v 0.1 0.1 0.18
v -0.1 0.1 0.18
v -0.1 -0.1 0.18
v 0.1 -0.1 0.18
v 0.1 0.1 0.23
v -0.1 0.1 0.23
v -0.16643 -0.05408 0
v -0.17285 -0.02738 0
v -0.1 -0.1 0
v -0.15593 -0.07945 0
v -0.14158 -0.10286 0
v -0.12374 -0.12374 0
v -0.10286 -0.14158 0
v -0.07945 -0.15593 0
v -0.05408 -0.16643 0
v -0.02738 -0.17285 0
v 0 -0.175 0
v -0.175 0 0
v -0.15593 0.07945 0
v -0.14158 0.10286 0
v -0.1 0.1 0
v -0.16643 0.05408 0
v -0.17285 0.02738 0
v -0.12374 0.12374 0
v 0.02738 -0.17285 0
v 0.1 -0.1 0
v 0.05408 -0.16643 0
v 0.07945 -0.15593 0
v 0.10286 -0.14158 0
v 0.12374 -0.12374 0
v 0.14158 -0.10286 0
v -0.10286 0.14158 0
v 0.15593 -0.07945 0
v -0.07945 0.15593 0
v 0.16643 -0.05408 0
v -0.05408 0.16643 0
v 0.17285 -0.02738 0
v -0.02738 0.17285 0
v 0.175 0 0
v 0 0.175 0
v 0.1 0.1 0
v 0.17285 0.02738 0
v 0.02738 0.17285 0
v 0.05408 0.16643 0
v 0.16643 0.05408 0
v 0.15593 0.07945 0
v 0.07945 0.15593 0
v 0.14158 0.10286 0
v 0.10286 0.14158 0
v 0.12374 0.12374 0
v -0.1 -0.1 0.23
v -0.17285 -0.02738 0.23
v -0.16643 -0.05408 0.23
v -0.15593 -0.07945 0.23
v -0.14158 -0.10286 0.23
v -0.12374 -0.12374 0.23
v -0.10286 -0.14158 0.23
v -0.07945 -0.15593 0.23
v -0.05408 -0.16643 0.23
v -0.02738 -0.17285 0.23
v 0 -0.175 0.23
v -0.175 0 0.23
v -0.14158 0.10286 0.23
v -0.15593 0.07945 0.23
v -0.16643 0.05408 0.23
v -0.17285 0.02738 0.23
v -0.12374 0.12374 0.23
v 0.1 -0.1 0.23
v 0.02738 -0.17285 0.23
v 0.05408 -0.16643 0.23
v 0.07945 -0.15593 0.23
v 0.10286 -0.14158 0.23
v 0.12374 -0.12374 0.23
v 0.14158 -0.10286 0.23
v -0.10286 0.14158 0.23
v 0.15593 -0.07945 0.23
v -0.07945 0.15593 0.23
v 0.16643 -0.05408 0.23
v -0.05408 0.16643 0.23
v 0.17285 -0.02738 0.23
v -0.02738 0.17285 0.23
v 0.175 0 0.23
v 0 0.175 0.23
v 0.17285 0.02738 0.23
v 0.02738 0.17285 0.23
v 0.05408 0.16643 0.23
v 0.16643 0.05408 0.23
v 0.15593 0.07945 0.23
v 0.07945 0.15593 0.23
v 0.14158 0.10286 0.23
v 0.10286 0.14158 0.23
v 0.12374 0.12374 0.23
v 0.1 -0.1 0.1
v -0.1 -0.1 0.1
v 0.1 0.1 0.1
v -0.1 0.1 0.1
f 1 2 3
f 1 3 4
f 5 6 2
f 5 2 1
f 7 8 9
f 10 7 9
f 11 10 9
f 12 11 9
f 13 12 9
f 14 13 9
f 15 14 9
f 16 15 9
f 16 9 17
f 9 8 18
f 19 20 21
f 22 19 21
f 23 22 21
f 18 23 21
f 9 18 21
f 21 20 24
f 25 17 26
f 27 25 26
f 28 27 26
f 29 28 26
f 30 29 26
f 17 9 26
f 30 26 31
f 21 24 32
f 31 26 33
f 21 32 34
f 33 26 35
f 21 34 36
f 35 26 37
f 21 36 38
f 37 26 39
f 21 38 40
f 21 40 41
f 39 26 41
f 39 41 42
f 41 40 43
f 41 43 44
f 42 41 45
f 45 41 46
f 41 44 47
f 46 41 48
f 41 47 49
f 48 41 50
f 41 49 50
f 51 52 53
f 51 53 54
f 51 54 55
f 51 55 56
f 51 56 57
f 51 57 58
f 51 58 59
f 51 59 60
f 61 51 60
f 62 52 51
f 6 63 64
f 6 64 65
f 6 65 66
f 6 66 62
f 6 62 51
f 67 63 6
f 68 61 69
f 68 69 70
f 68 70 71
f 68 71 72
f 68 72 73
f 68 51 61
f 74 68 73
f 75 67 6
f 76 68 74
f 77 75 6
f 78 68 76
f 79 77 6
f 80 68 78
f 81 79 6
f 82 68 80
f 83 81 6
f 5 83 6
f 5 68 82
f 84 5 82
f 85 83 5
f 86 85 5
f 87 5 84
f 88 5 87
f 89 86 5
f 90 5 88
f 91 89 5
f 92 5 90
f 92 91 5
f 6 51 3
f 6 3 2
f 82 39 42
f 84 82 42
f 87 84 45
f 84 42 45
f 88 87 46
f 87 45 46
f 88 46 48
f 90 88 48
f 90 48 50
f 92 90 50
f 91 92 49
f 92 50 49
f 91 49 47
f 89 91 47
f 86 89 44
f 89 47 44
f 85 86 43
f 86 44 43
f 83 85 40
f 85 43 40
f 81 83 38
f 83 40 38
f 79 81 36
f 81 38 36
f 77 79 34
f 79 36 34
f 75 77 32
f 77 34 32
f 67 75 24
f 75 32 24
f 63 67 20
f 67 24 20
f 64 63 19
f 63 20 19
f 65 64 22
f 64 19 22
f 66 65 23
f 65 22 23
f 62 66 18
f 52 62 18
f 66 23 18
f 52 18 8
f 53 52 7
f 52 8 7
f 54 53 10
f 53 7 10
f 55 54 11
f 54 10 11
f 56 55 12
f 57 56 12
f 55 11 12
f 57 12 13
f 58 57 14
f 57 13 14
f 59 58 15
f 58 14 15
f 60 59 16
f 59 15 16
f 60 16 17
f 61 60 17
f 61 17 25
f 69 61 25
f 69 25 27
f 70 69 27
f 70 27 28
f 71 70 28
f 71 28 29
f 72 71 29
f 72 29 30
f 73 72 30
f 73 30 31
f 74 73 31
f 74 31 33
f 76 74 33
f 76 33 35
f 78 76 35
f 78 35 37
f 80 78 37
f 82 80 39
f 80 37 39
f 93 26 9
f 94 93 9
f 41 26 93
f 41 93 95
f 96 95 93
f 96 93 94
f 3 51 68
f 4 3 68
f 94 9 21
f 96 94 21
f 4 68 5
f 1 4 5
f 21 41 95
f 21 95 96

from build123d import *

# Parameters (mm, degrees)
SKETCH1_R           = 0.175
BOSS_EXTRUDE1_DEPTH = 0.23
SKETCH2_W           = 0.2
SKETCH2_H           = 0.2
CUT_EXTRUDE1_DEPTH  = 0.05
SKETCH3_W           = 0.2
SKETCH3_H           = 0.2
CUT_EXTRUDE2_DEPTH  = 0.1


with BuildPart() as part:
    # Sketch1 → Boss-Extrude1 (new body)
    with BuildSketch(Plane.XY):
        Circle(SKETCH1_R)
    extrude(amount=BOSS_EXTRUDE1_DEPTH)

    # Sketch2 → Cut-Extrude1 (cut)
    with BuildSketch(Plane.XY.offset(0.23)):
        Rectangle(SKETCH2_W, SKETCH2_H)
    extrude(amount=-CUT_EXTRUDE1_DEPTH, mode=Mode.SUBTRACT)

    # Sketch3 → Cut-Extrude2 (cut)
    with BuildSketch(Plane(origin=(0, 0, 0), x_dir=(-1, 0, 0), z_dir=(0, 0, -1))):
        Rectangle(SKETCH3_W, SKETCH3_H)
    extrude(amount=-CUT_EXTRUDE2_DEPTH, mode=Mode.SUBTRACT)


solid = part.part
